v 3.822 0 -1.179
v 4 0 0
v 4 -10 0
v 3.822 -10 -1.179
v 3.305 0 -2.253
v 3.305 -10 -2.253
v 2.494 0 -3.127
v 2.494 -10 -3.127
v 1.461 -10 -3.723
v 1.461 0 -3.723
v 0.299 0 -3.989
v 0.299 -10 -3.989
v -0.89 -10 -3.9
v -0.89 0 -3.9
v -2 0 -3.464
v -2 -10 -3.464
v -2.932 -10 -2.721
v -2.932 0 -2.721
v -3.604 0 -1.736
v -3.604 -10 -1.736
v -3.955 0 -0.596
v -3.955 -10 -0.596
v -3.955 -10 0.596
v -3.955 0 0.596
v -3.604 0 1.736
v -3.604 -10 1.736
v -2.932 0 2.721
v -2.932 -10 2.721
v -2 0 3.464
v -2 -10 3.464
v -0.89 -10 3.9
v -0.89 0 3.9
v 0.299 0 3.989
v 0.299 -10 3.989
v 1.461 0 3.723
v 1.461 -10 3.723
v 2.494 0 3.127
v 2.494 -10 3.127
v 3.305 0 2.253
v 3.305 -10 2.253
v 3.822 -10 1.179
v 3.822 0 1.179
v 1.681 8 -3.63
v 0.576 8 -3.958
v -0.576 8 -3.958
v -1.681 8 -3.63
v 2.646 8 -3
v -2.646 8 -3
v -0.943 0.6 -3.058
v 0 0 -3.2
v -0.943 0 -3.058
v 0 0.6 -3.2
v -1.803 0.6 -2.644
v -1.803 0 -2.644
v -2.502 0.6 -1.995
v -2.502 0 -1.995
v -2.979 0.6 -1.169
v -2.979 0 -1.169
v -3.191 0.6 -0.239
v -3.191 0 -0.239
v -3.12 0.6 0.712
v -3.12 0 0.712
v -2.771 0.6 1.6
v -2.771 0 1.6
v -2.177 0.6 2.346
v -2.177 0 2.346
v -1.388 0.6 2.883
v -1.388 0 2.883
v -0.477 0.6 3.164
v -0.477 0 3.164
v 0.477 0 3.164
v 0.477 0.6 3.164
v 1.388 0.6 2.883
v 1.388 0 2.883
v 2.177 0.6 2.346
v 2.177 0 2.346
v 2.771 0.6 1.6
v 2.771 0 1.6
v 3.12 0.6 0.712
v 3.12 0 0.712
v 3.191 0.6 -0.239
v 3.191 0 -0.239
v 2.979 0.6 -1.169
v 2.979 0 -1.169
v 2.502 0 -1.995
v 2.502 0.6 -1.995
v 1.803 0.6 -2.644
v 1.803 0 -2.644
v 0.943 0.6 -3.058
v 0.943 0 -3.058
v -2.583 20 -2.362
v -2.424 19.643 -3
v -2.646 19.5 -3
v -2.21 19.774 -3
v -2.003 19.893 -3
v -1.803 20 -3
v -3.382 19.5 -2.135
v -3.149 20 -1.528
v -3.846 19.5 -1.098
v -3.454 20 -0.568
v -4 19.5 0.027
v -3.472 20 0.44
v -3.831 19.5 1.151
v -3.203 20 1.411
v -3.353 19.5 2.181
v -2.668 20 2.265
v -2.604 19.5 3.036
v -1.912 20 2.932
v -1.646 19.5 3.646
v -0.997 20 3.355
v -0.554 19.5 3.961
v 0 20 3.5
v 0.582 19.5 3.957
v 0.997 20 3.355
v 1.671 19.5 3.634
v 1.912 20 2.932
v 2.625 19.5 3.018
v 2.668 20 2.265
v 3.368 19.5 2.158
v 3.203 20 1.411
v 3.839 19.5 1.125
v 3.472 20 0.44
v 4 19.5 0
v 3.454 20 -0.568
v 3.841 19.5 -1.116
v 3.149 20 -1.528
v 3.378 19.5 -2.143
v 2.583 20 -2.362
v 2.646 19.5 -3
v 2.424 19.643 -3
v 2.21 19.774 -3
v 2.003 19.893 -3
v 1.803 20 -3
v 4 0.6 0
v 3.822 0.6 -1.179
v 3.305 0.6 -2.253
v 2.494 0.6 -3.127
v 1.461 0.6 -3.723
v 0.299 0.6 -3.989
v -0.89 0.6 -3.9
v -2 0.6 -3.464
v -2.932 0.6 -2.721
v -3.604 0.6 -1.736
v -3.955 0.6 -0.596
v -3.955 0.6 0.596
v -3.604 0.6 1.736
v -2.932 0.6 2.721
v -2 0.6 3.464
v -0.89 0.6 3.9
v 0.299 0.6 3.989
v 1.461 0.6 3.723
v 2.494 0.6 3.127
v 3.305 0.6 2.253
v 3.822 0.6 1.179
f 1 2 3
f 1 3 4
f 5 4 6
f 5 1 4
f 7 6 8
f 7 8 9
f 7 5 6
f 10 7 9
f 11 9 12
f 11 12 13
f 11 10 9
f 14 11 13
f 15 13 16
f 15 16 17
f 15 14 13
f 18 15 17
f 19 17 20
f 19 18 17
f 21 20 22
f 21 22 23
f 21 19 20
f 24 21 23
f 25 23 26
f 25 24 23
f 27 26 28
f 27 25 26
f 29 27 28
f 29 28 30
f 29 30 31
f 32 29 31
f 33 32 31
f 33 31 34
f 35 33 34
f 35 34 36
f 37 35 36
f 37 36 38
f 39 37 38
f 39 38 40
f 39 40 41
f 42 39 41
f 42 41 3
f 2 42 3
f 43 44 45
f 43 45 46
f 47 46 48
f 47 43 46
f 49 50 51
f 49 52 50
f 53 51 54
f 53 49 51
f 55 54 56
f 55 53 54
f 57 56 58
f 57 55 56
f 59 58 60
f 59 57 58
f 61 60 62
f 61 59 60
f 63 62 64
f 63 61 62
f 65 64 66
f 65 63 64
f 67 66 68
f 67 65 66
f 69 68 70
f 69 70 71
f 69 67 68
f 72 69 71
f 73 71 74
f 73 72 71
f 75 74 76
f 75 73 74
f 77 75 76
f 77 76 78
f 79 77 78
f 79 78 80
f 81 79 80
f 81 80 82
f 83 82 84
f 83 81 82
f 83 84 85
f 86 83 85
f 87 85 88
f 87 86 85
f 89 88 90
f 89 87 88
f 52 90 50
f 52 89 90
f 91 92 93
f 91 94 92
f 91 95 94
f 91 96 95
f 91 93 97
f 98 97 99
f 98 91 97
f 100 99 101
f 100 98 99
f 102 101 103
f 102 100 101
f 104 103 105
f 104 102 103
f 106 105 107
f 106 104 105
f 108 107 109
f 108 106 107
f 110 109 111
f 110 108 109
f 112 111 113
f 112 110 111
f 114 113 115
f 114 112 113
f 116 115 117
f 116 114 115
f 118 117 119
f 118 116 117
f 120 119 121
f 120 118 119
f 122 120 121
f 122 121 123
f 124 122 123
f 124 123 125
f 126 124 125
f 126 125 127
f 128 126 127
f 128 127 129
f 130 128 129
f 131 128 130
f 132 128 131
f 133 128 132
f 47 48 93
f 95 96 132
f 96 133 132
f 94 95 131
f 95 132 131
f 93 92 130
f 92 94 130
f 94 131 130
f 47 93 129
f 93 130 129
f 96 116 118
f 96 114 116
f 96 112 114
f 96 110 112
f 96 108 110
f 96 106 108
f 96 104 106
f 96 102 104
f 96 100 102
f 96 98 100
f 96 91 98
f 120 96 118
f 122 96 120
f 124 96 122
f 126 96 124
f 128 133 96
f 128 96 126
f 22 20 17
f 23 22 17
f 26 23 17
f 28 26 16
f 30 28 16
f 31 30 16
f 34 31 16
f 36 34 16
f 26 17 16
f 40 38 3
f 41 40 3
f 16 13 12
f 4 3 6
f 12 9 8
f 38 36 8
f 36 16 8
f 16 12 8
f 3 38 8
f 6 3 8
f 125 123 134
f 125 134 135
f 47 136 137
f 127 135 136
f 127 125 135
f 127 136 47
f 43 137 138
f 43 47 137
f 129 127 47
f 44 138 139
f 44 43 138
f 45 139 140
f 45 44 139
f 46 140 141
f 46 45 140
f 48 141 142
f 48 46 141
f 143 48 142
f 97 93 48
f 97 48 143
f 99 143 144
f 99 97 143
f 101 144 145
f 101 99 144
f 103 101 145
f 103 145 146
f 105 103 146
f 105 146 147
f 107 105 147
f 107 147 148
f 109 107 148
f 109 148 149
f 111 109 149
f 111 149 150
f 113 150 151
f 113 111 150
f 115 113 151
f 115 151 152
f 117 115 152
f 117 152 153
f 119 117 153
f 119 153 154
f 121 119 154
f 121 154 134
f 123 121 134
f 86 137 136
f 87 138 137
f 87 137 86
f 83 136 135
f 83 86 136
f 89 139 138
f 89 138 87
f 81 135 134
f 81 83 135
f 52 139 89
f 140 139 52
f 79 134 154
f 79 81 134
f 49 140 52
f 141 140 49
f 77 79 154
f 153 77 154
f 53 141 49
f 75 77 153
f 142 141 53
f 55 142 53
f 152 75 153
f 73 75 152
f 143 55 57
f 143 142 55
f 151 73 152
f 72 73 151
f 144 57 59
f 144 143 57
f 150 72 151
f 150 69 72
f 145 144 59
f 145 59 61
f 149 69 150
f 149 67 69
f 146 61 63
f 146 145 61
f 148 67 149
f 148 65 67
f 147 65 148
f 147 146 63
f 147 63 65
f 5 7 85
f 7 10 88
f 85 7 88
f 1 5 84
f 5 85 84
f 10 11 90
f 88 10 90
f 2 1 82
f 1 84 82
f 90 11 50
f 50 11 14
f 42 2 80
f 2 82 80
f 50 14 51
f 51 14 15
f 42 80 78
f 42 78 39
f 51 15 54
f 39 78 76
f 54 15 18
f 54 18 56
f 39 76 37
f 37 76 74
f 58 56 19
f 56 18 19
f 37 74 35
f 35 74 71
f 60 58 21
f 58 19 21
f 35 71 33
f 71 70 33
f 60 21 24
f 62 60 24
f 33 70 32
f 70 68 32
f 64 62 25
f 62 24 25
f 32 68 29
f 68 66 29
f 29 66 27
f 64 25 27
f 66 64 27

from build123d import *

# Parameters (mm, degrees)
SKETCH1_R                = 4
BOSS_EXTRUDE1_DEPTH      = 20
BOSS_EXTRUDE1_DEPTH_BACK = 10
CHAMFER1_SIZE            = 0.5
CUT_EXTRUDE1_DEPTH       = 12
SKETCH3_W                = 1.701892275
SKETCH3_H                = 0.6


with BuildPart() as part:
    # Sketch1 → Boss-Extrude1 (new body, two sides)
    with BuildSketch(Plane(origin=(0, 0, 0), x_dir=(1, 0, 0), z_dir=(0, 1, 0))) as boss_extrude1_sk:
        Circle(SKETCH1_R)
    extrude(amount=BOSS_EXTRUDE1_DEPTH)
    extrude(boss_extrude1_sk.sketch, amount=-BOSS_EXTRUDE1_DEPTH_BACK)

    # Chamfer1
    chamfer1_edges = [part.edges().sort_by_distance(p)[0] for p in [
        (-4, 20, 0),
    ]]
    chamfer(chamfer1_edges, length=CHAMFER1_SIZE)

    # Sketch2 → Cut-Extrude1 (cut)
    with BuildSketch(Plane(origin=(0, 20, 0), x_dir=(1, 0, 0), z_dir=(0, 1, 0))):
        with BuildLine():
            Line((-2.645751311, 3), (2.645751311, 3))
            ThreePointArc((2.645751311, 3), (0, 4), (-2.645751311, 3))
        make_face()
    extrude(amount=-CUT_EXTRUDE1_DEPTH, mode=Mode.SUBTRACT)

    # Sketch3 → Cut-Revolve1 (revolve, cut)
    with BuildSketch(Plane(origin=(0, 0, 0), x_dir=(0, 0, -1), z_dir=(1, 0, 0))):
        with Locations((4.050946138, 0.3)):
            Rectangle(SKETCH3_W, SKETCH3_H)
    revolve(axis=Axis((0, 0, 0), (0, 1, 0)), mode=Mode.SUBTRACT)


solid = part.part
